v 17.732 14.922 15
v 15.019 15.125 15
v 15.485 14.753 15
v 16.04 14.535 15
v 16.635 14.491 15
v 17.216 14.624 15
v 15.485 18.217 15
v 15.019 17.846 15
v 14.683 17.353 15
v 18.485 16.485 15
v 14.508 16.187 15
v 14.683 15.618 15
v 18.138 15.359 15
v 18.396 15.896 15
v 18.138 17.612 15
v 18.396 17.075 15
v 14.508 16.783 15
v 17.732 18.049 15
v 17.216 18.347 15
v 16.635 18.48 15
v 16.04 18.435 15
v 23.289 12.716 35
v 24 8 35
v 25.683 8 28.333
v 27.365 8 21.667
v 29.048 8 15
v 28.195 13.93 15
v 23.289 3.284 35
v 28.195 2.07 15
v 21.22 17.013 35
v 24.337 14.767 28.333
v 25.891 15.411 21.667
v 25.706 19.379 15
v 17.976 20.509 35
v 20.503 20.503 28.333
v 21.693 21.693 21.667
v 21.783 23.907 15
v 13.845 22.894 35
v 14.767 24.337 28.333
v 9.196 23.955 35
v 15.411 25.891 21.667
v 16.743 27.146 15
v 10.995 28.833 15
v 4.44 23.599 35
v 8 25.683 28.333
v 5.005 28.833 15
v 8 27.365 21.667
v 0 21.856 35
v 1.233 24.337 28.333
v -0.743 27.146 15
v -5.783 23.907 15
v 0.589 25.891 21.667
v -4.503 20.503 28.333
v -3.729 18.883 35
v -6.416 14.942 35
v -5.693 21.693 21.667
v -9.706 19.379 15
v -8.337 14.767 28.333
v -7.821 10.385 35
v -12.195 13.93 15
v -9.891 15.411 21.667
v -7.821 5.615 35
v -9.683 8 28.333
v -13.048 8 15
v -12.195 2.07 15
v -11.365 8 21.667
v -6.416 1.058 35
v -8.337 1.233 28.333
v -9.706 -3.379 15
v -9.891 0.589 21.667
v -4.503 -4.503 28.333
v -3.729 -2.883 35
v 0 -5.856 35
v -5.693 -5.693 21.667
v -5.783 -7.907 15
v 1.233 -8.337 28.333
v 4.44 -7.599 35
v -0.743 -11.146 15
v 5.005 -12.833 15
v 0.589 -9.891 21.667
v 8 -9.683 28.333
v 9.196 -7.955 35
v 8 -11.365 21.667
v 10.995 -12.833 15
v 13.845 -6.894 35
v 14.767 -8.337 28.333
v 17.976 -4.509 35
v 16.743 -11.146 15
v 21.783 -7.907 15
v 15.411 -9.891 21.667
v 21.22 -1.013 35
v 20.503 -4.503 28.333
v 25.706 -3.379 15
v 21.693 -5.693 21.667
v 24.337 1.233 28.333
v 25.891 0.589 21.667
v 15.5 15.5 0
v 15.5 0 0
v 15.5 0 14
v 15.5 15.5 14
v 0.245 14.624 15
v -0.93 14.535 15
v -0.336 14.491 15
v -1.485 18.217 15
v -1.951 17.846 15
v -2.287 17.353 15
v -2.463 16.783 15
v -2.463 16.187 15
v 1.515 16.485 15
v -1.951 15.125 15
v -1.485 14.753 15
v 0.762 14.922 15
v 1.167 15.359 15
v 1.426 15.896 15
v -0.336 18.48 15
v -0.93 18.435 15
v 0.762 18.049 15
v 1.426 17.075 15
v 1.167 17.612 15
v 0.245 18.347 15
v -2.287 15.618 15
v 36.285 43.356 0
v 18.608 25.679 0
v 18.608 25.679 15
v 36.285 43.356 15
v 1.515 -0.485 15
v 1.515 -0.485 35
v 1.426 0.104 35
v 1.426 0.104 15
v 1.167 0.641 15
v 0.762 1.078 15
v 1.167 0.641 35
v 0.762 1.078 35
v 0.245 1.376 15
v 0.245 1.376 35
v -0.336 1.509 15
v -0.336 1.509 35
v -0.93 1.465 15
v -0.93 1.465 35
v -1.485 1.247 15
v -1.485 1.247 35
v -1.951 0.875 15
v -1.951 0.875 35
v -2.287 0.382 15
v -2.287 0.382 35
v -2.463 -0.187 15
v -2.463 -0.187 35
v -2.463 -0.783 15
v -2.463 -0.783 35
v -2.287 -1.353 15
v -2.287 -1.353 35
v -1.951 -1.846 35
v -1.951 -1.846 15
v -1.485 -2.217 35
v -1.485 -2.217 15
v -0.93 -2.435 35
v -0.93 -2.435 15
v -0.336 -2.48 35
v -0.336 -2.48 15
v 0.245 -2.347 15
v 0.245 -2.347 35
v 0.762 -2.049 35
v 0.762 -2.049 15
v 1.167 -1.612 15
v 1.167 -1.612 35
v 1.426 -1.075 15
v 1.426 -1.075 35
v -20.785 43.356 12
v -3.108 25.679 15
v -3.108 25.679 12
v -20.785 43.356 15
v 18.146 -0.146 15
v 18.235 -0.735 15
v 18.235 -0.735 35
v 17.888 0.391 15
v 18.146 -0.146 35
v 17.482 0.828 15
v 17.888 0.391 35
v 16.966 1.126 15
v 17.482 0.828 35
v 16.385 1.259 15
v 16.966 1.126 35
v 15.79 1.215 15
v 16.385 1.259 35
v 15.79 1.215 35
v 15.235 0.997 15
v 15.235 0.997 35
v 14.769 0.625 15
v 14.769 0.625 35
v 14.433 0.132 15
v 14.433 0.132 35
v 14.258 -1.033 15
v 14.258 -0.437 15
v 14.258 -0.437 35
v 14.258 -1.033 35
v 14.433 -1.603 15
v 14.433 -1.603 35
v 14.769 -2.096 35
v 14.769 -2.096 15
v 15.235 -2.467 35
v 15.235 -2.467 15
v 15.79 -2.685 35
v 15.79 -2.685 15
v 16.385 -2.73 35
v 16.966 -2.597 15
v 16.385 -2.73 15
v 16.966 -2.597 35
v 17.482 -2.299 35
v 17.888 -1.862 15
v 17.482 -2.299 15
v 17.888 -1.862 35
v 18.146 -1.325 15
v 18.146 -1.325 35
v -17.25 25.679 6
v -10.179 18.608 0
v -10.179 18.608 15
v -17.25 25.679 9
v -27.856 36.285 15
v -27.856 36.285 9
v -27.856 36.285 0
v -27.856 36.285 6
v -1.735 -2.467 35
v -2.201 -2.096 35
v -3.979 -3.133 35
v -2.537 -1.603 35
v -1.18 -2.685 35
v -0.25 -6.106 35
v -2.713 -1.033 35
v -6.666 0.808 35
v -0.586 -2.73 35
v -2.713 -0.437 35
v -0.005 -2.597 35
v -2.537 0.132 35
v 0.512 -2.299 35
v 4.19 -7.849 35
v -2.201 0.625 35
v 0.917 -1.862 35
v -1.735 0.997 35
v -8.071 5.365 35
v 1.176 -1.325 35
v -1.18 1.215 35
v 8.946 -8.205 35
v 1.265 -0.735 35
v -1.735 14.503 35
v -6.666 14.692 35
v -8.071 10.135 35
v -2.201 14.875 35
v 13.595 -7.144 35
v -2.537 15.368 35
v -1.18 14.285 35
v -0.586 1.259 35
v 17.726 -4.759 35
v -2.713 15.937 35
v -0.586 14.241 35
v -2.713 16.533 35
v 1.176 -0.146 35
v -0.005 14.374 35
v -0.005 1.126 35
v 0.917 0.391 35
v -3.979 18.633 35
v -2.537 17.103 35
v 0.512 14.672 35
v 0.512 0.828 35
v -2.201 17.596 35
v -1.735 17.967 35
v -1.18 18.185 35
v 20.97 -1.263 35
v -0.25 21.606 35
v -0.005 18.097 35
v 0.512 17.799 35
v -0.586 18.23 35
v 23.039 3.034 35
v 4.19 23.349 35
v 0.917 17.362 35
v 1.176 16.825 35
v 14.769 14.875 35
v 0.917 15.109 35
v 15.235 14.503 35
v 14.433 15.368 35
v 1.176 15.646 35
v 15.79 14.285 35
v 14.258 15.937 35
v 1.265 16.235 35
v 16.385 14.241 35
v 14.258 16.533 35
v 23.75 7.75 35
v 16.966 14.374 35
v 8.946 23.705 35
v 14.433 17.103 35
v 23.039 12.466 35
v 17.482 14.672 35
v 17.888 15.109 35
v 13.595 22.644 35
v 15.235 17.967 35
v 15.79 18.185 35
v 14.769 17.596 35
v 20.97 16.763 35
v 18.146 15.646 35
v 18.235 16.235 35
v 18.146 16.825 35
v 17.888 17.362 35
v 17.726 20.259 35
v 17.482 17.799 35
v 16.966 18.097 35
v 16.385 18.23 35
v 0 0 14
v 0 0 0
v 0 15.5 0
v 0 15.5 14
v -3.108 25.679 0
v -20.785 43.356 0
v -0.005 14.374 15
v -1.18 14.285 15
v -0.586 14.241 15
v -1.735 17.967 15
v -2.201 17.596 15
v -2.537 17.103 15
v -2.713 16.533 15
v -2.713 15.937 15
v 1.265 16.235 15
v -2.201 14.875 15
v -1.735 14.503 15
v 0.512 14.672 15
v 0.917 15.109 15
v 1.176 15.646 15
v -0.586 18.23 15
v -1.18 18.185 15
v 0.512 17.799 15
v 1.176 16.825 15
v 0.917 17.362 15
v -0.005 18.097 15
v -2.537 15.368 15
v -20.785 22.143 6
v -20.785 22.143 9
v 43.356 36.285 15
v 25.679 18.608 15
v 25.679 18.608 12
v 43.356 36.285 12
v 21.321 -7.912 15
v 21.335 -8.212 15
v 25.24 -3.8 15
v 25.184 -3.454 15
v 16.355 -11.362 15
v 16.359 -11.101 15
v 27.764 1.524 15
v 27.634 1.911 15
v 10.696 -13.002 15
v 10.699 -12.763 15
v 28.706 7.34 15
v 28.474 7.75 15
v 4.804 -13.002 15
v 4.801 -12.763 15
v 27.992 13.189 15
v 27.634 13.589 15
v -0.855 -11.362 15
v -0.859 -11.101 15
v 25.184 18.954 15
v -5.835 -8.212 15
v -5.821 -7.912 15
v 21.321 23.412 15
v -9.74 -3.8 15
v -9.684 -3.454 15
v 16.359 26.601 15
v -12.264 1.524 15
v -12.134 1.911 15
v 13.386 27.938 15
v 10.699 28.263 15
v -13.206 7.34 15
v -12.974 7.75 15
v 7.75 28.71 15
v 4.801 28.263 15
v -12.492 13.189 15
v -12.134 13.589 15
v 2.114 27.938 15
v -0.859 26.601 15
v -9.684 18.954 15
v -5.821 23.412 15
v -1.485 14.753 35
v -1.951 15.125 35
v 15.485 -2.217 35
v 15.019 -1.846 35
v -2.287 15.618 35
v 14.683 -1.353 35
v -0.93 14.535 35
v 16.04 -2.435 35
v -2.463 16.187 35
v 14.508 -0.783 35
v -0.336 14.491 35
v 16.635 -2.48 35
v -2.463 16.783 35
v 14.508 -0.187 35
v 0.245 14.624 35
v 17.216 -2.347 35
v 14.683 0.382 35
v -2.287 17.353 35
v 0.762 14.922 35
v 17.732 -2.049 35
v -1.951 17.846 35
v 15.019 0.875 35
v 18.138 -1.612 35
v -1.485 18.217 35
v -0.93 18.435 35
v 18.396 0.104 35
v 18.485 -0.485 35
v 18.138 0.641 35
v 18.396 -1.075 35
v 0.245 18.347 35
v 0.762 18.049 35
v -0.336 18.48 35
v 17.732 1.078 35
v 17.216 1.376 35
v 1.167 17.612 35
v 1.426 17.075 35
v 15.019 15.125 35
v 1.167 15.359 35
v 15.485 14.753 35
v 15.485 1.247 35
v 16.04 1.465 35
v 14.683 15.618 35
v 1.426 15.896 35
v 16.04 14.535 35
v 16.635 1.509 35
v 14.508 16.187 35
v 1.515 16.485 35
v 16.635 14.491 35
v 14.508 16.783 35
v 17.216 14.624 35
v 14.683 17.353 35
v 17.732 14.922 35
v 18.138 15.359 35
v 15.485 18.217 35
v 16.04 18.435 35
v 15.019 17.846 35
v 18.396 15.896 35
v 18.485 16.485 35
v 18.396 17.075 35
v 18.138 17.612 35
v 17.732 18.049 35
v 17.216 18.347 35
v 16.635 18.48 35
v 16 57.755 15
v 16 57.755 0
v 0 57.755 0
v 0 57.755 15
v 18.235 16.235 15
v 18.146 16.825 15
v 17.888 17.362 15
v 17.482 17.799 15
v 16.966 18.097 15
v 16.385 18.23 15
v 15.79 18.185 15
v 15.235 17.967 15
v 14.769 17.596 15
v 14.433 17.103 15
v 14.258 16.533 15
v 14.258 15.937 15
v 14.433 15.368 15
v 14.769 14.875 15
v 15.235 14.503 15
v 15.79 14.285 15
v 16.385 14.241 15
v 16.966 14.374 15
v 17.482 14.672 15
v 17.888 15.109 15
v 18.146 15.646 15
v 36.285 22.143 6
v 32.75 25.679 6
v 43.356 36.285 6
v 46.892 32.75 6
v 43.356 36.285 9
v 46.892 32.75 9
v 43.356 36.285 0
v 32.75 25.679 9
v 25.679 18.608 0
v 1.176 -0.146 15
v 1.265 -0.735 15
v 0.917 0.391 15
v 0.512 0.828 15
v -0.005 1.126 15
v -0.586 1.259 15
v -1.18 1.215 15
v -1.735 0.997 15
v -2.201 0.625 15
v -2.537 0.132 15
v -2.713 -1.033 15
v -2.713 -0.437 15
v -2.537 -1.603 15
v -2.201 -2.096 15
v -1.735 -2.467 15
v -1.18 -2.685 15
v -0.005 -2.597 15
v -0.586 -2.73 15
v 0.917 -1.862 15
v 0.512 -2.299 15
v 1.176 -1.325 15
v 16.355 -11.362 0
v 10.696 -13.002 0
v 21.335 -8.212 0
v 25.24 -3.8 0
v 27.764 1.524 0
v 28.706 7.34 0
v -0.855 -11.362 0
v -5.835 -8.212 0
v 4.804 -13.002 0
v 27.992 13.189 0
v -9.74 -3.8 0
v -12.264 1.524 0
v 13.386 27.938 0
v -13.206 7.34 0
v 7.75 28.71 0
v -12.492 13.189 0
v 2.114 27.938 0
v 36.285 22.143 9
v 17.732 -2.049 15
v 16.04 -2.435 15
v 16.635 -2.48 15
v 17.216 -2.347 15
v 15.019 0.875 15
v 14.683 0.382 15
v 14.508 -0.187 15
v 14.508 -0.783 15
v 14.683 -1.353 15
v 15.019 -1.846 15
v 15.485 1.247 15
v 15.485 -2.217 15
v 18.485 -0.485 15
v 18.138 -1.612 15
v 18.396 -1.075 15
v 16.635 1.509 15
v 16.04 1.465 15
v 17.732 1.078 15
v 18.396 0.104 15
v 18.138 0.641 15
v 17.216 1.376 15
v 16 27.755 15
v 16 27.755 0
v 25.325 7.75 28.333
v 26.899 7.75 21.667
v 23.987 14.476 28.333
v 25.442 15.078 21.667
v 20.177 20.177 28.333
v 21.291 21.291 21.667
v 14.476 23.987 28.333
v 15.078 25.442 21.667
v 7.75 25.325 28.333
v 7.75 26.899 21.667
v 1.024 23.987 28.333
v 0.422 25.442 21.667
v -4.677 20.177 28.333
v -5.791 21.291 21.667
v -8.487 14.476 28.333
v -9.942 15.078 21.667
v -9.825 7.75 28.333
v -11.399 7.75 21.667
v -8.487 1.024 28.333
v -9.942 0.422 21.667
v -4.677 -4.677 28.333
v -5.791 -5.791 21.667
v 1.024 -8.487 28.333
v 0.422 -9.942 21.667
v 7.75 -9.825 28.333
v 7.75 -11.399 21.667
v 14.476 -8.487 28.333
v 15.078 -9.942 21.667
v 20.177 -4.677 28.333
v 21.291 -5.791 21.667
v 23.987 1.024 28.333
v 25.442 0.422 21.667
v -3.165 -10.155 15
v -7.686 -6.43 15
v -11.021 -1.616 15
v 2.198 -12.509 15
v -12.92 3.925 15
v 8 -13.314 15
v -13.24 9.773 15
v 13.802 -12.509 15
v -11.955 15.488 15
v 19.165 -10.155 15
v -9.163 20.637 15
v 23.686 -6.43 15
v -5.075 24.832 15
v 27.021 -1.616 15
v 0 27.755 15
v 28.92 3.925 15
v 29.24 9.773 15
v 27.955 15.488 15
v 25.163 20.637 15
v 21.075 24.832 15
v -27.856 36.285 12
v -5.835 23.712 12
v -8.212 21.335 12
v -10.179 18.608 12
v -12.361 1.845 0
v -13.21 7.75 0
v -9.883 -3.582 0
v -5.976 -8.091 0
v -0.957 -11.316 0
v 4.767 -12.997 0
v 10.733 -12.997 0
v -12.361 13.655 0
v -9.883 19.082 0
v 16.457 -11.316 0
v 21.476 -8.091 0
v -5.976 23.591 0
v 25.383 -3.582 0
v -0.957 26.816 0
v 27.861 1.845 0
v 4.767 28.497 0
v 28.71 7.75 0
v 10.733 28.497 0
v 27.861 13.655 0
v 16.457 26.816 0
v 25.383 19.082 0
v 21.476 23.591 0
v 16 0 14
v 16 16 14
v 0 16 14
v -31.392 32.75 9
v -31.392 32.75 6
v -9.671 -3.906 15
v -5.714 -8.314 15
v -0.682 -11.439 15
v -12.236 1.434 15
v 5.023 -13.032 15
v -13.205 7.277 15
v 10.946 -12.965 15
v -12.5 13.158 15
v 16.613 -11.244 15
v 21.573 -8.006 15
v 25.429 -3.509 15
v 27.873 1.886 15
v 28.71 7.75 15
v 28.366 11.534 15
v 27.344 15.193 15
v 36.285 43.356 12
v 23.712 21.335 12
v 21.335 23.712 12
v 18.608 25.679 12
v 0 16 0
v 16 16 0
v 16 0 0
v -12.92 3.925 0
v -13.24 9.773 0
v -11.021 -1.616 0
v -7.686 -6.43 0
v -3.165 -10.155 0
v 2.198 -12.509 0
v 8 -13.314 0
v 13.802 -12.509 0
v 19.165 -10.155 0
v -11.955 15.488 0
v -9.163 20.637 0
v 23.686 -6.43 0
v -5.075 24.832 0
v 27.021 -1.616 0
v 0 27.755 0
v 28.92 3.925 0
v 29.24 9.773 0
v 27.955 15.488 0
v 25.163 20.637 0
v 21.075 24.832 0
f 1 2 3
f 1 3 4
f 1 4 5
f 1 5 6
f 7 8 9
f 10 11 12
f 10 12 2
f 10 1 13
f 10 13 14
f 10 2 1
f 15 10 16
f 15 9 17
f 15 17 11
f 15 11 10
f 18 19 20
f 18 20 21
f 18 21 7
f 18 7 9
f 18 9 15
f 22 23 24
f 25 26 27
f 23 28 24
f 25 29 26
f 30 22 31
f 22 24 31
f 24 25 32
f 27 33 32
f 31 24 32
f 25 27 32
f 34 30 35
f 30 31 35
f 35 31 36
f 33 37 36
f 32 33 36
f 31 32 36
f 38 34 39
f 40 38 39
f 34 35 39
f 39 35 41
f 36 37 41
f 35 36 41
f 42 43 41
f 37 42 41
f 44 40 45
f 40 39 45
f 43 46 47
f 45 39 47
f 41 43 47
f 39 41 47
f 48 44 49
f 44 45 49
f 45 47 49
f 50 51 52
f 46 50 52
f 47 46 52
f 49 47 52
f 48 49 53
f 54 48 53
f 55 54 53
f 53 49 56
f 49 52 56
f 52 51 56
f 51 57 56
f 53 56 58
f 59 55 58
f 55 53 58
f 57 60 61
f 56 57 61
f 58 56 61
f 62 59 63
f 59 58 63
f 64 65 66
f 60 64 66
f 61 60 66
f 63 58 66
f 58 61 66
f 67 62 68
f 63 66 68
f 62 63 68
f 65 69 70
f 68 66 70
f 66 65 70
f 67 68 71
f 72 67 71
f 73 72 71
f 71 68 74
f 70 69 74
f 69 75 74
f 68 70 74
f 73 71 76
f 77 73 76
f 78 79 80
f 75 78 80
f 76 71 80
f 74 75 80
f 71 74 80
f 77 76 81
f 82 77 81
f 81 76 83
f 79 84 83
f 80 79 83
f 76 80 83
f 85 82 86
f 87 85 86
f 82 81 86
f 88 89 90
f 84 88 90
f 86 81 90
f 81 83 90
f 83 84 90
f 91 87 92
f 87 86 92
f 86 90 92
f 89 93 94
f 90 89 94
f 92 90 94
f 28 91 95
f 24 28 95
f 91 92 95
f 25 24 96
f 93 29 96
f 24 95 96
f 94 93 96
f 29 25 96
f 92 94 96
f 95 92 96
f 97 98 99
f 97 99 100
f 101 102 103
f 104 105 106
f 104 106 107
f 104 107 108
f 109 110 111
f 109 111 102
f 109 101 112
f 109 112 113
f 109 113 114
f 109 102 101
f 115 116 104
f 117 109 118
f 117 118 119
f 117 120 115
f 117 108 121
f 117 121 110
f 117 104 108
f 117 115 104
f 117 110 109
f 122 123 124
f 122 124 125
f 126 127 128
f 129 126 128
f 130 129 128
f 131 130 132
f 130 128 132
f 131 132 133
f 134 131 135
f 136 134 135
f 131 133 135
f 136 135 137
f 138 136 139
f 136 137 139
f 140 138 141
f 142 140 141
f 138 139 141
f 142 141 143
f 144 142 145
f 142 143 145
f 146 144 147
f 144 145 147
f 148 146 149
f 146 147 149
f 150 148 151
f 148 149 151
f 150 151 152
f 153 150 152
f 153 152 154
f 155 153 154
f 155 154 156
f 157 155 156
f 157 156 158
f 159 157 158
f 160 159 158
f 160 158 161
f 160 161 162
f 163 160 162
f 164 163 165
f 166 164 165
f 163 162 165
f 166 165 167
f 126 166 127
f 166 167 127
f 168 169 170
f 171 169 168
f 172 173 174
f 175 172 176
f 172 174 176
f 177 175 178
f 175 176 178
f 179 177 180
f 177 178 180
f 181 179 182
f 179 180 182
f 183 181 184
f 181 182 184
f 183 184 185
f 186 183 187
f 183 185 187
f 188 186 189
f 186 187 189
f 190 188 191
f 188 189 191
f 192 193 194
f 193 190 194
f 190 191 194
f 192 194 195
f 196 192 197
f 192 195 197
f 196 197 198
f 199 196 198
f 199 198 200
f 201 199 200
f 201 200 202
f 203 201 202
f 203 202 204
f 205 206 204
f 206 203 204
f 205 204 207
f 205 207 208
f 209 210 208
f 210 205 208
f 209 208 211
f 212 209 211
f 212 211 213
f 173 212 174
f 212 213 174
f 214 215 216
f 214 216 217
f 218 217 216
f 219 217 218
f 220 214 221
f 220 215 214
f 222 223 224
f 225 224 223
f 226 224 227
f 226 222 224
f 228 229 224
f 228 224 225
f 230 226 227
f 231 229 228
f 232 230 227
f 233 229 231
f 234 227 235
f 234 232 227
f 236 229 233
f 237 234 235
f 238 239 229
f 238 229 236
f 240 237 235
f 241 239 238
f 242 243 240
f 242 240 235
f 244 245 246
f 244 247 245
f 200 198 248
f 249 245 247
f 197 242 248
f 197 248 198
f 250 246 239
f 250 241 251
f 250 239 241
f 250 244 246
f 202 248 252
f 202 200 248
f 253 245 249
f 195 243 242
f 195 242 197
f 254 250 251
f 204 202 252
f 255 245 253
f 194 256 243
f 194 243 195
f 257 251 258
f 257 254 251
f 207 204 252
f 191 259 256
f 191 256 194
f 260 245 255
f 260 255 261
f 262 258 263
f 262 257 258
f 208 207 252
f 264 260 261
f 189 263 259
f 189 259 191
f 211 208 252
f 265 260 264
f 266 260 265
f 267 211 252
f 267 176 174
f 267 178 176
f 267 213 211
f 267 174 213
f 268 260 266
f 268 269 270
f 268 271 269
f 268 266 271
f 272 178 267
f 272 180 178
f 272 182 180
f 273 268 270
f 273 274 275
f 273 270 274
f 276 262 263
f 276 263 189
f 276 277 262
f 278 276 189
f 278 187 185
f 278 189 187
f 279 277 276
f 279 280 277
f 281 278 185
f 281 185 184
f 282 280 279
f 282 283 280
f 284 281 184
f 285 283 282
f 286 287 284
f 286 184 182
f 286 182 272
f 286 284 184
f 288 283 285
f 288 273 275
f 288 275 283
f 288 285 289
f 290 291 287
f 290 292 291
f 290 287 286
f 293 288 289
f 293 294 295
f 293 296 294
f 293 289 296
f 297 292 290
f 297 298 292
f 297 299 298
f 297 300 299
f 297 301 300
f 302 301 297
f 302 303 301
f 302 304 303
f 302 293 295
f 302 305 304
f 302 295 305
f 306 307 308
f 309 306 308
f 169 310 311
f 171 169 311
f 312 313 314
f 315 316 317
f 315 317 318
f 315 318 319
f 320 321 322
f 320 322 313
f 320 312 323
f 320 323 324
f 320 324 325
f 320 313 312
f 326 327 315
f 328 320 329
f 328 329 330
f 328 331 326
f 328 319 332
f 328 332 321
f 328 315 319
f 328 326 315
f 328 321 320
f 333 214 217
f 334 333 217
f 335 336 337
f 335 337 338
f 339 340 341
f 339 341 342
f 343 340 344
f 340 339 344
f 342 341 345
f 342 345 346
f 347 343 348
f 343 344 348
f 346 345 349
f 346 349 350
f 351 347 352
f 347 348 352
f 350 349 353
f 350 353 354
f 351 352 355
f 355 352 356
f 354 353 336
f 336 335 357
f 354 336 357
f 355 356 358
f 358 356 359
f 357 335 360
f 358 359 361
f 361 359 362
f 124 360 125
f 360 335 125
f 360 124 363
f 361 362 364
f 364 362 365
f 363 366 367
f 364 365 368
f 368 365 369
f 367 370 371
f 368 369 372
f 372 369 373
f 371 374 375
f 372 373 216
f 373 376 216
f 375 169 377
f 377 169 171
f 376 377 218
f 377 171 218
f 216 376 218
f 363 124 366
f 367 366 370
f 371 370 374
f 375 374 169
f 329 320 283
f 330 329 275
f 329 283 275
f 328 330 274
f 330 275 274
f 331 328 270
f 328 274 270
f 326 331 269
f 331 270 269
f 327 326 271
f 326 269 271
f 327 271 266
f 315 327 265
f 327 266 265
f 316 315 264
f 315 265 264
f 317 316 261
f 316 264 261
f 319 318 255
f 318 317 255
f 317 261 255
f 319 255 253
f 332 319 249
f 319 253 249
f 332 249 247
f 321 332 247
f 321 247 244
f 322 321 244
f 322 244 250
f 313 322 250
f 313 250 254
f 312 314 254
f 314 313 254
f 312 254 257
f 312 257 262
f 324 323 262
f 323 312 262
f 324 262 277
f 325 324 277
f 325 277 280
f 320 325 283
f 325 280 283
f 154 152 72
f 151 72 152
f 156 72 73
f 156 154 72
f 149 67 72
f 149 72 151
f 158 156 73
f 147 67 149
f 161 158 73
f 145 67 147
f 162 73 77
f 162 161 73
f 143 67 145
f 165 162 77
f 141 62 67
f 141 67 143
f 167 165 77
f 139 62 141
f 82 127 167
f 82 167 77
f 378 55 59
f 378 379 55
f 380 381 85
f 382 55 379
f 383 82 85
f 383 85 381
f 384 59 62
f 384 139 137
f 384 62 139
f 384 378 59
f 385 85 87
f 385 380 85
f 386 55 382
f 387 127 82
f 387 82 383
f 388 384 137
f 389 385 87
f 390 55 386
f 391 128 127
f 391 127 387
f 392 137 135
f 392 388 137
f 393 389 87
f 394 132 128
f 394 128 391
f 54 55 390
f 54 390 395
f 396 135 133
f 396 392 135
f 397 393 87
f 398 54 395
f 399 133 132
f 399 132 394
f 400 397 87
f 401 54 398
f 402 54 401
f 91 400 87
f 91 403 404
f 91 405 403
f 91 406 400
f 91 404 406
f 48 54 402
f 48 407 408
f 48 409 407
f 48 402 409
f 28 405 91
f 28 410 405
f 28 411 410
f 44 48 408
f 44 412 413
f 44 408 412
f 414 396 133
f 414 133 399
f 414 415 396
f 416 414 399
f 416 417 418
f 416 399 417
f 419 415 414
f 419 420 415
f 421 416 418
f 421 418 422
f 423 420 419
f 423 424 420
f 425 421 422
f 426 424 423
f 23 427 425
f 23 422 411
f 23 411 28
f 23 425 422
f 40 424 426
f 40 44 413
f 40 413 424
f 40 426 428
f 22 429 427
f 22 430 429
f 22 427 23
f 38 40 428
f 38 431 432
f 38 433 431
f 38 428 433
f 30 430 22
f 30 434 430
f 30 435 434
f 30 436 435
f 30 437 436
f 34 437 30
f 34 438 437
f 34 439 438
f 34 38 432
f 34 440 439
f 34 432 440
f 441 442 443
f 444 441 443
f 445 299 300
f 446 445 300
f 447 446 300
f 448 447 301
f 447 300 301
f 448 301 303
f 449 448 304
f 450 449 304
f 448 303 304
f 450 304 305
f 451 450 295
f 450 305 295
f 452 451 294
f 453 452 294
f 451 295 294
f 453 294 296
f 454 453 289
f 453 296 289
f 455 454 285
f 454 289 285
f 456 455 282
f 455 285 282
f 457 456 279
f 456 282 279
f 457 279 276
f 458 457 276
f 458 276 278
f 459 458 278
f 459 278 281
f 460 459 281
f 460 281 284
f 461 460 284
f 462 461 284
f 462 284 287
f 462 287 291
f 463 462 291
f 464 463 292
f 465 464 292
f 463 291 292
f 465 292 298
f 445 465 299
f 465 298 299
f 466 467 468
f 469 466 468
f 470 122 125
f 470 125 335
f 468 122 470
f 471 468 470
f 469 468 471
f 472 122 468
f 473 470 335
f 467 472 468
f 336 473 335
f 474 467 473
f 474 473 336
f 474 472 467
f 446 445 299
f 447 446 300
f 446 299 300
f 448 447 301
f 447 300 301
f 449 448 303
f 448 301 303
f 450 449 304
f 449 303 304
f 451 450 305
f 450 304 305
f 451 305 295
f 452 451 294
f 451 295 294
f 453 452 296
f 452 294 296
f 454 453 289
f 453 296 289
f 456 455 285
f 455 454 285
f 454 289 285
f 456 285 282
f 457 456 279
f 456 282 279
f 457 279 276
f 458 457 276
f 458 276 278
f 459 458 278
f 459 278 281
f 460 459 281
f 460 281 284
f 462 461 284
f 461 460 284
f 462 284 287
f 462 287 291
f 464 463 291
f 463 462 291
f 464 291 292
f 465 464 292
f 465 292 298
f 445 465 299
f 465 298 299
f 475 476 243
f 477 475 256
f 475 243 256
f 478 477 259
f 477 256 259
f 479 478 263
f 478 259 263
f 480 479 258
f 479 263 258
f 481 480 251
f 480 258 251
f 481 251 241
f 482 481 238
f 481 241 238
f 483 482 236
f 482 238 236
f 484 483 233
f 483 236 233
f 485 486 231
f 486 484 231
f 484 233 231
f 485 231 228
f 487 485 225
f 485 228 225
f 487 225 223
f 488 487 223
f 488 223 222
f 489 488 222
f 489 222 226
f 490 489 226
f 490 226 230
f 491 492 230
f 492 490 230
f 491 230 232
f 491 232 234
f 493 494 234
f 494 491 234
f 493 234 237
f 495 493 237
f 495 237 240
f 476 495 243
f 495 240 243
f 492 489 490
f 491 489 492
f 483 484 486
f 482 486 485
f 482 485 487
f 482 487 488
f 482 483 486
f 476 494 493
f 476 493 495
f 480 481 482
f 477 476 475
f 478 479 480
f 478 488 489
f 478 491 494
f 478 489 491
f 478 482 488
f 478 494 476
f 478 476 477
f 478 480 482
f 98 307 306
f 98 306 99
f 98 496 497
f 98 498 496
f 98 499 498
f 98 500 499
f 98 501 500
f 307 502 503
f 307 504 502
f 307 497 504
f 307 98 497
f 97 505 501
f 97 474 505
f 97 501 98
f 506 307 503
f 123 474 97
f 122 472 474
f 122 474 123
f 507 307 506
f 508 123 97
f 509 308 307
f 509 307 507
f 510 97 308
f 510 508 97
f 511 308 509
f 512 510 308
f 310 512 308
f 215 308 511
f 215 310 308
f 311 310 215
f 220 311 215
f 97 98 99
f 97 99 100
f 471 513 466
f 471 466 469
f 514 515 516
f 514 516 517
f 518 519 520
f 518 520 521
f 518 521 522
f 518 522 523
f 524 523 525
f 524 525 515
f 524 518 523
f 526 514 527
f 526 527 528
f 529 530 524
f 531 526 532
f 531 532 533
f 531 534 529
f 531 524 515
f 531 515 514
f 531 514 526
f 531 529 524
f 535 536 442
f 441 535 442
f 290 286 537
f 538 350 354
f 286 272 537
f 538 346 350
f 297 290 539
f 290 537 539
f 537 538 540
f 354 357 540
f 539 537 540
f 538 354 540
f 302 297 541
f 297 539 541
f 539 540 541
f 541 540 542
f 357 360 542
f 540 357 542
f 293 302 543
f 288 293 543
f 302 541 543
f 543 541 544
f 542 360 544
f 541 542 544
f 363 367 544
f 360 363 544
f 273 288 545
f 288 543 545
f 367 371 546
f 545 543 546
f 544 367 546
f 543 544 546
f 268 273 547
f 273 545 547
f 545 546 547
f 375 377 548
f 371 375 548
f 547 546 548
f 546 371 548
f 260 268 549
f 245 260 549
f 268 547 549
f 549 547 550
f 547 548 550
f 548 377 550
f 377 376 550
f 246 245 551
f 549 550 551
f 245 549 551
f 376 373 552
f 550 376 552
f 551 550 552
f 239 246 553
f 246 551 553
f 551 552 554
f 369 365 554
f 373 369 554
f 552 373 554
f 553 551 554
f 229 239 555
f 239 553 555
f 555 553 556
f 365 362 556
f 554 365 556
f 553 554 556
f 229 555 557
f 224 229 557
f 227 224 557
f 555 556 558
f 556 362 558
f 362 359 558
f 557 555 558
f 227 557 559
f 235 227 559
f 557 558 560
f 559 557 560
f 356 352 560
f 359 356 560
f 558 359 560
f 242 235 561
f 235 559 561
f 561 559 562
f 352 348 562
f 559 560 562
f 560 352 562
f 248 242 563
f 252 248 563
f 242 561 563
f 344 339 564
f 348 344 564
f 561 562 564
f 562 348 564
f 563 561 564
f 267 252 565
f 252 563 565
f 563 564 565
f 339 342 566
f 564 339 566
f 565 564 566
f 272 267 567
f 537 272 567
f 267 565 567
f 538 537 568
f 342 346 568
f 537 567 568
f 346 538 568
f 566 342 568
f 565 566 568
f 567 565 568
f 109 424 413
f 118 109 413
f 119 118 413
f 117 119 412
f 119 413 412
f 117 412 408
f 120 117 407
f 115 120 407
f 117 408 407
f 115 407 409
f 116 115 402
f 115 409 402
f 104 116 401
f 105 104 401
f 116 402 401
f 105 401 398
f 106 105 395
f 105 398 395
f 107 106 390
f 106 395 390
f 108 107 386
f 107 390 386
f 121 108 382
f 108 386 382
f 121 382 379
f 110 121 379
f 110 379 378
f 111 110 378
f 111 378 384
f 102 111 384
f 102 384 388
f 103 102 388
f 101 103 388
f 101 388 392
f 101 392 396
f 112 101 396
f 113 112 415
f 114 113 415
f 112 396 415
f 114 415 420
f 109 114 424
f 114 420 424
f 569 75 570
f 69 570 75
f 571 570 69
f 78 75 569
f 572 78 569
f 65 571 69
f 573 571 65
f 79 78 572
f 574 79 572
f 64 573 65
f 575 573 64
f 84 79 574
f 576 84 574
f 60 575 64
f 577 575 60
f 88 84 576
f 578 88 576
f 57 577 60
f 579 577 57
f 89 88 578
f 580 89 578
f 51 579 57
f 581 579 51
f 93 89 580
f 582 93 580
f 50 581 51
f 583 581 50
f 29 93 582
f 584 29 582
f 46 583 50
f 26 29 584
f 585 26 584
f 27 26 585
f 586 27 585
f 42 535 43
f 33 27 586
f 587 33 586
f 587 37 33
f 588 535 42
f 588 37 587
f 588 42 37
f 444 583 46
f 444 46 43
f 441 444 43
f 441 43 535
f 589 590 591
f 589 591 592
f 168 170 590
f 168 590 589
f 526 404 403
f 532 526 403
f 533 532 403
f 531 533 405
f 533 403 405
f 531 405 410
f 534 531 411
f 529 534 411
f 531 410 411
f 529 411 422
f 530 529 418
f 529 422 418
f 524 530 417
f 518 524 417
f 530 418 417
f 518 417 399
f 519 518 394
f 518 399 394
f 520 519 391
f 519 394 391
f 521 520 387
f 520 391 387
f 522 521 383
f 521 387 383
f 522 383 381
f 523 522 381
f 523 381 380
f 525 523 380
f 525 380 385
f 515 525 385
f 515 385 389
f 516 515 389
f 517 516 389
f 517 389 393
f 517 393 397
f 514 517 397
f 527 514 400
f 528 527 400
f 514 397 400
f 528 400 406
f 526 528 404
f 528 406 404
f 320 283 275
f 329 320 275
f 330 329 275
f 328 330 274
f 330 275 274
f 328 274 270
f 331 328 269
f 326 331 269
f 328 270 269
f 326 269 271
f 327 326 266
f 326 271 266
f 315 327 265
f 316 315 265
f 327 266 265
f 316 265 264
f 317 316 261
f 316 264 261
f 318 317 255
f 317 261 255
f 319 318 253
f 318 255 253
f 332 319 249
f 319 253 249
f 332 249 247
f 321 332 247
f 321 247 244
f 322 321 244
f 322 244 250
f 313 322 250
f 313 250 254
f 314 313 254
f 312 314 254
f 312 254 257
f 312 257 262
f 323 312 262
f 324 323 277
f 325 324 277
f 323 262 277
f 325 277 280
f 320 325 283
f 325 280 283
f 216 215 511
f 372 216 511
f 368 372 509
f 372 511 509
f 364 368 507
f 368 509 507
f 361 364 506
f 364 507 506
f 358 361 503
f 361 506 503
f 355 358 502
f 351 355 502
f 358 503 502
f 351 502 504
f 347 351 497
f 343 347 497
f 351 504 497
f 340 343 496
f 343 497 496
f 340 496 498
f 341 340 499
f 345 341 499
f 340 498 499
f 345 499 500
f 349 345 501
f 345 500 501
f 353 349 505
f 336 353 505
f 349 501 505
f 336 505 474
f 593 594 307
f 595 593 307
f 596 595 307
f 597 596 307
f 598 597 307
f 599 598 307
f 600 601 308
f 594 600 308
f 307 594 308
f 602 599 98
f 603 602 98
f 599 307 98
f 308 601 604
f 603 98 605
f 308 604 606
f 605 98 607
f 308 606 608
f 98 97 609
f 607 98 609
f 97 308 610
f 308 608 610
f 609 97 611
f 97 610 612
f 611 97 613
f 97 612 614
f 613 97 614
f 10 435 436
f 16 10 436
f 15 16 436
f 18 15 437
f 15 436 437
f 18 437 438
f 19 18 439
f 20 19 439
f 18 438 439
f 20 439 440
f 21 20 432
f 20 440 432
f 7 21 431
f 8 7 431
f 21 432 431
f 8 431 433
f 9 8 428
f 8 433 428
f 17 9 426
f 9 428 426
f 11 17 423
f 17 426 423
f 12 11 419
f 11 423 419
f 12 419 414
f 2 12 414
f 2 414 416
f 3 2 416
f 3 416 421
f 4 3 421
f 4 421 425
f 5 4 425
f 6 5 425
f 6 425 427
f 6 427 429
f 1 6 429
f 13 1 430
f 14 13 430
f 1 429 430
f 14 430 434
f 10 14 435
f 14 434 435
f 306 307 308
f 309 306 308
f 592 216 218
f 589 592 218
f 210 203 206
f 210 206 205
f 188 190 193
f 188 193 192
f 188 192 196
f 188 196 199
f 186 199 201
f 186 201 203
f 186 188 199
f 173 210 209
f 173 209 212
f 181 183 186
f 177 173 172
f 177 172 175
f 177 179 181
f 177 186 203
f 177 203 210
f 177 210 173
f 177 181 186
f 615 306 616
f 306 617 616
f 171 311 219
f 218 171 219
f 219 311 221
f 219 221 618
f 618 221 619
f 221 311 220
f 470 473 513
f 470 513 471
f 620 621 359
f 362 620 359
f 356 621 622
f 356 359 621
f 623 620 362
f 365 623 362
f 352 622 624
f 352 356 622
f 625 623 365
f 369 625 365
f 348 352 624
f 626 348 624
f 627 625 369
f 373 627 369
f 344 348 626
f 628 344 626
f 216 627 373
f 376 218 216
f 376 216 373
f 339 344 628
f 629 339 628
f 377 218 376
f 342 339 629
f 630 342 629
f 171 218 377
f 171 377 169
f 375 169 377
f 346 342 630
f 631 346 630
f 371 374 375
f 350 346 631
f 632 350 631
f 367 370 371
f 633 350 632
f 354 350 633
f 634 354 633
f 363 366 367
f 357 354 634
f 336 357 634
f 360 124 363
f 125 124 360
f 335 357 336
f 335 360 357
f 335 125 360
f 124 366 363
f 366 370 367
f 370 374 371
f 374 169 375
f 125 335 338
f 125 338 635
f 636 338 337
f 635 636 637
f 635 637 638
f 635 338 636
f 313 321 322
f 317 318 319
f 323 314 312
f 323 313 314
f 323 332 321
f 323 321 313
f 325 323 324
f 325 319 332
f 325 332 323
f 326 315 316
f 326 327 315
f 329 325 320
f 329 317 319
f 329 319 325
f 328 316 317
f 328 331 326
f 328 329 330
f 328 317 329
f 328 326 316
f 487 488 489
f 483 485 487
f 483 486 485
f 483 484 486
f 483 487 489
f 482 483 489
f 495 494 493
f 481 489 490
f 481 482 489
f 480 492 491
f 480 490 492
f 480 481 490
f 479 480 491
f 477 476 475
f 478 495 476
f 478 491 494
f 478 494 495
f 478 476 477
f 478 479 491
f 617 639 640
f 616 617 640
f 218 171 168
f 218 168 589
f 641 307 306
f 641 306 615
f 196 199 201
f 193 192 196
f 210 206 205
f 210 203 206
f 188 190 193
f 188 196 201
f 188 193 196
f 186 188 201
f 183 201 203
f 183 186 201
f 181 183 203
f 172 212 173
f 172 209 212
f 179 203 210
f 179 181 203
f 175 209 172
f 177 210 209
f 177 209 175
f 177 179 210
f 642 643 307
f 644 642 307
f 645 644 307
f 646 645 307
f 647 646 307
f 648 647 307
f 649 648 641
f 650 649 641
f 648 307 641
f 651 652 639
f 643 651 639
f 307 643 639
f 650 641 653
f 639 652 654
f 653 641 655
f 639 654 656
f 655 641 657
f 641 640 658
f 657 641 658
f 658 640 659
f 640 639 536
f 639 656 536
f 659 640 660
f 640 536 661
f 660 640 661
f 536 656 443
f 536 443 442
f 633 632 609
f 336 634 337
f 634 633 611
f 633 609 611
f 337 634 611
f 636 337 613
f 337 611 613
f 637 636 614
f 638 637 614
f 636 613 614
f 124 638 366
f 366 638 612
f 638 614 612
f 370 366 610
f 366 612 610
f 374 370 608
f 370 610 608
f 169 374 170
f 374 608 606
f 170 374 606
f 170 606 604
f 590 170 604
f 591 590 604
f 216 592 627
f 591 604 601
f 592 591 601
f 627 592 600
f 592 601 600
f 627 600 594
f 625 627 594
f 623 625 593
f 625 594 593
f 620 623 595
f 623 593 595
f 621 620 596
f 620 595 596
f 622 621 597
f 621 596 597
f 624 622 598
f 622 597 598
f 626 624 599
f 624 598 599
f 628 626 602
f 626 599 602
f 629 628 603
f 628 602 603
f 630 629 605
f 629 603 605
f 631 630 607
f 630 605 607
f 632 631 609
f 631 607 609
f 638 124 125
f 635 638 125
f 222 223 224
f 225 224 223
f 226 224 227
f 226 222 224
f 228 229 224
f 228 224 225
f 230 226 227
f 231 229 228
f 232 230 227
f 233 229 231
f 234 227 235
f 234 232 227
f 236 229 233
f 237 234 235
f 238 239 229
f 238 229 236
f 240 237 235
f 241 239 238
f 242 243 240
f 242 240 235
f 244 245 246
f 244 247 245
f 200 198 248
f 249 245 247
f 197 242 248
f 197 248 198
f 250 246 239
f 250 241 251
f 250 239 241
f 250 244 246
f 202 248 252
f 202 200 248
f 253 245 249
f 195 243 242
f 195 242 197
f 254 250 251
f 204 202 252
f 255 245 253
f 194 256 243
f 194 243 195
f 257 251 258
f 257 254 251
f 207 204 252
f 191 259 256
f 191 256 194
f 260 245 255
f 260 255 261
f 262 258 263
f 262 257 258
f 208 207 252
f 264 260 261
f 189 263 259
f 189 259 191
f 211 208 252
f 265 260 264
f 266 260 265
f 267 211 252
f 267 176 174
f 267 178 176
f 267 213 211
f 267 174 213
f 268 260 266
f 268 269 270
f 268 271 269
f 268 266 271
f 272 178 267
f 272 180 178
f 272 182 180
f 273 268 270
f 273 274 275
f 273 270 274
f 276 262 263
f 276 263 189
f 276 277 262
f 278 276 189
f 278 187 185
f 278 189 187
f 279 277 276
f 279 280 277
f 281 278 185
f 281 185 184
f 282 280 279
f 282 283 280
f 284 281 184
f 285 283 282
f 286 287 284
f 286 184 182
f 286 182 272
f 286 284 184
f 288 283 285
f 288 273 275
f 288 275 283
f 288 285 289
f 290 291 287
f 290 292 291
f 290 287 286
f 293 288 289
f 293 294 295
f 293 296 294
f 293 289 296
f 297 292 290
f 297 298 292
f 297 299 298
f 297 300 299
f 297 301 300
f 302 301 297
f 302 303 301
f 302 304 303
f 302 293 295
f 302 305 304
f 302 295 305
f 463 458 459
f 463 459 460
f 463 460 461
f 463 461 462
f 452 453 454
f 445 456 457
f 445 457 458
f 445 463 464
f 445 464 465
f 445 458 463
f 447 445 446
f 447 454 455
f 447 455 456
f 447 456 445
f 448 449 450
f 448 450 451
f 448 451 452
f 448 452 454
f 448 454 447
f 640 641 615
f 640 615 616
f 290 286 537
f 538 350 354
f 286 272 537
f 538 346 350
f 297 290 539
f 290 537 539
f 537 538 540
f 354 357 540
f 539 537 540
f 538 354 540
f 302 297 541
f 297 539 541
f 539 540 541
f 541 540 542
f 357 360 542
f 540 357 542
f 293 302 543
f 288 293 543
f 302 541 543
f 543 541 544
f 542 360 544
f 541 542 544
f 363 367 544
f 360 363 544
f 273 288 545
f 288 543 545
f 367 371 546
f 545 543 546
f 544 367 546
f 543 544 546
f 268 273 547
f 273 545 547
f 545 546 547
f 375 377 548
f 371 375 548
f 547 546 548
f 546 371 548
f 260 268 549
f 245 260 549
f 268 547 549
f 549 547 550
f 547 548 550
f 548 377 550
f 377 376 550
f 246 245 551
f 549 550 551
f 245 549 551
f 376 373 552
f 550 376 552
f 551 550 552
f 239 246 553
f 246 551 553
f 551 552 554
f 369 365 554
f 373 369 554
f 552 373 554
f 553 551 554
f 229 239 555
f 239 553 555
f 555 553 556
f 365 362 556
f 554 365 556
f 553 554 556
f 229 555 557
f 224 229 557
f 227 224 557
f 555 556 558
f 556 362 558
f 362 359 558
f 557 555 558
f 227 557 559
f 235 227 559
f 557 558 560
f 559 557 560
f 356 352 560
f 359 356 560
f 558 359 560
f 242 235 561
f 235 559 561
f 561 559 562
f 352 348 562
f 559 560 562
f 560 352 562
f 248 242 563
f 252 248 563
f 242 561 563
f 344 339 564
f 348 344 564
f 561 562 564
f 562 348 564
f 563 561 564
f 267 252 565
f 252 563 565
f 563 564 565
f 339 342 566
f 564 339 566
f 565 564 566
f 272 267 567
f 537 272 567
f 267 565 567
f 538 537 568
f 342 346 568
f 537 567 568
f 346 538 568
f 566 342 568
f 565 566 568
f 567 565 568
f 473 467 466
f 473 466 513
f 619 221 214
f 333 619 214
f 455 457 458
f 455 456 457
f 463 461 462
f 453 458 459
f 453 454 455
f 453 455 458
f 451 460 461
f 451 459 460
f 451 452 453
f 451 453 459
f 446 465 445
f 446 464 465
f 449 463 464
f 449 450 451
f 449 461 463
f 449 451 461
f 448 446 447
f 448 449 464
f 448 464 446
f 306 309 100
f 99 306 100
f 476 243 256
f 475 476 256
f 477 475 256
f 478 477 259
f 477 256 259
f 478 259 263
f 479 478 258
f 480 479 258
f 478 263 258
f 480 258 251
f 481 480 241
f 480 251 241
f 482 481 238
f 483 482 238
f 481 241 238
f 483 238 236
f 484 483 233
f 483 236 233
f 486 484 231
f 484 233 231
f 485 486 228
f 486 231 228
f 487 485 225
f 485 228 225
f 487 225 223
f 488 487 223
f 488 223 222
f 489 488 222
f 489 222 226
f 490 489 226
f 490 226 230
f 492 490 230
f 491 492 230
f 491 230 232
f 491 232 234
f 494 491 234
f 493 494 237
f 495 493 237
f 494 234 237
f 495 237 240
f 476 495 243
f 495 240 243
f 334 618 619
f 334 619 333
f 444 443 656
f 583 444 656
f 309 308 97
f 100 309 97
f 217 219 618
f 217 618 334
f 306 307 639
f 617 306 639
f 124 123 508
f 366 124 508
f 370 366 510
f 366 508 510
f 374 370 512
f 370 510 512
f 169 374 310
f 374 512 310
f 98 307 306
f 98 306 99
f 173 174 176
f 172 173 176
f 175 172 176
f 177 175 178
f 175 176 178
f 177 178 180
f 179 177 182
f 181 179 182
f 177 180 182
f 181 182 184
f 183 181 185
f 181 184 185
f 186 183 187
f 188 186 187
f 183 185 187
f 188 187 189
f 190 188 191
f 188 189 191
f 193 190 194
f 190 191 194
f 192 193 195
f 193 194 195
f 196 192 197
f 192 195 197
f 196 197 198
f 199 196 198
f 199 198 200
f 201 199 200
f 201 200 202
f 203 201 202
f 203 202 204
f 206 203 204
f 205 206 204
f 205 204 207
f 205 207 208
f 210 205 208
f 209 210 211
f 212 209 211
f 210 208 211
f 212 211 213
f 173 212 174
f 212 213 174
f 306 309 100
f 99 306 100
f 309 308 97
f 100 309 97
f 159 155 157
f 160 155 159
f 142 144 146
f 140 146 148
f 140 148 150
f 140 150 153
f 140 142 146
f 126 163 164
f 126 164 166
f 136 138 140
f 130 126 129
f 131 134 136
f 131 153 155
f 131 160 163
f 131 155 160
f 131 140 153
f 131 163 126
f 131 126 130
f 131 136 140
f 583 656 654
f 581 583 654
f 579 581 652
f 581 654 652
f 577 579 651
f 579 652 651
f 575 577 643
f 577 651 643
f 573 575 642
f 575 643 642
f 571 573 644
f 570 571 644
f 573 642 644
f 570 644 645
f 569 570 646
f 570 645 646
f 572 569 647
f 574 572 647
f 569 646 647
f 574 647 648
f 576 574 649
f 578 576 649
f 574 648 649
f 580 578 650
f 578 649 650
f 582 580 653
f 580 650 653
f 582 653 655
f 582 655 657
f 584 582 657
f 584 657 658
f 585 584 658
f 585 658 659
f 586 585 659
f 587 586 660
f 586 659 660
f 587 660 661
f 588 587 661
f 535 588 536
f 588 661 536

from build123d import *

# Parameters (mm, degrees)
SKETCH005_R                               = 2
EXTRUDE001_DEPTH                          = 20
SKETCH_W                                  = 16
SKETCH_H                                  = 16
EXTRUDE_DEPTH                             = 15
SKETCH003_R                               = 16
SKETCH004_R                               = 21.3
SKETCH010_AS_DRAWN_W                      = 15
SKETCH010_AS_DRAWN_H                      = 3
EXTRUDE004_DEPTH                          = 5
EXTRUDE004_ONTO_SKETCH010_ROLL_ANGLE      = 90
EXTRUDE004_ONTO_SKETCH010_PLACEMENT_ANGLE = 45
SKETCH011_AS_DRAWN_W                      = 15
SKETCH011_AS_DRAWN_H                      = 3
EXTRUDE005_DEPTH                          = 5
EXTRUDE005_ONTO_SKETCH011_ROLL_ANGLE      = 90
EXTRUDE005_ONTO_SKETCH011_PLACEMENT_ANGLE = -45
SKETCH009_R                               = 2
EXTRUDE003_DEPTH                          = 20
SKETCH007_R                               = 16
SKETCH008_R                               = 20.9601551084
SKETCH006_W                               = 15.5
SKETCH006_H                               = 15.5
EXTRUDE002_DEPTH                          = 15
EXTRUDE008_DEPTH                          = 3
SKETCH015_R                               = 2
EXTRUDE007_DEPTH                          = 20
SKETCH013_R                               = 16
SKETCH014_R                               = 20.9601551084
SKETCH012_R                               = 20.9601551084
SKETCH012_W                               = 15.5
SKETCH012_H                               = 15.5
EXTRUDE006_DEPTH                          = 15


with BuildPart() as screwholes:
    # Sketch005 (on Face2 of Loft) → Extrude001 (new body)
    with BuildSketch(Plane.XY.offset(35)):
        with Locations((16.4852813742, 16.4852813742)):
            Circle(SKETCH005_R)
        with Locations((-0.4852813742, 16.4852813742)):
            Circle(SKETCH005_R)
        with Locations((-0.4852813742, -0.4852813742)):
            Circle(SKETCH005_R)
        with Locations((16.4852813742, -0.4852813742)):
            Circle(SKETCH005_R)
    extrude(amount=-EXTRUDE001_DEPTH)


with BuildPart() as socket:
    # Sketch → Extrude (new body)
    with BuildSketch(Plane.XY):
        with BuildLine():
            ThreePointArc((0, 27.7553580069), (8, -13.313708499), (16, 27.7553580069))
            Line((16, 27.7553580069), (16, 57.7553580069))
            Line((16, 57.7553580069), (0, 57.7553580069))
            Line((0, 57.7553580069), (0, 27.7553580069))
        make_face()
        with Locations((8, 8)):
            Rectangle(SKETCH_W, SKETCH_H, mode=Mode.SUBTRACT)
    extrude(amount=EXTRUDE_DEPTH)


with BuildPart() as adapter:
    # Sketch003 (on Face10 of Extrude) → Loft section 0
    with BuildSketch(Plane.XY.offset(35)):
        with Locations((8, 8)):
            Circle(SKETCH003_R)
    # Sketch004 (on Face10 of Extrude) → Loft section 1
    with BuildSketch(Plane.XY.offset(14)):
        with Locations((8, 8)):
            Circle(SKETCH004_R)
    loft()

    # Fusion: union Socket
    add(socket.part)

    # Cut: cut ScrewHoles
    add(screwholes.part, mode=Mode.SUBTRACT)


with BuildPart() as extrude004:
    # Sketch010 as drawn → Extrude004 (new)
    with BuildSketch(Plane.XY):
        with Locations((48.8152061319, 7.5)):
            Rectangle(SKETCH010_AS_DRAWN_W, SKETCH010_AS_DRAWN_H)
    extrude(amount=EXTRUDE004_DEPTH)


with BuildPart() as extrude004_1:
    # Extrude004 onto Sketch010 roll: moved
    add(extrude004.part.rotate(Axis((0, 0, 0), (1, 0, 0)), EXTRUDE004_ONTO_SKETCH010_ROLL_ANGLE))


with BuildPart() as extrude004_2:
    # Extrude004 onto Sketch010 placement: moved
    add(extrude004_1.part.moved(Location((3.5355339059, -3.5355339059, 0))).rotate(Axis((3.5355339059, -3.5355339059, 0), (0, 0, 1)), EXTRUDE004_ONTO_SKETCH010_PLACEMENT_ANGLE))


with BuildPart() as extrude005:
    # Sketch011 as drawn → Extrude005 (new)
    with BuildSketch(Plane.XY):
        with Locations((-37.8550510235, 7.5)):
            Rectangle(SKETCH011_AS_DRAWN_W, SKETCH011_AS_DRAWN_H)
    extrude(amount=EXTRUDE005_DEPTH)


with BuildPart() as extrude005_1:
    # Extrude005 onto Sketch011 roll: moved
    add(extrude005.part.rotate(Axis((0, 0, 0), (1, 0, 0)), EXTRUDE005_ONTO_SKETCH011_ROLL_ANGLE))


with BuildPart() as extrude005_2:
    # Extrude005 onto Sketch011 placement: moved
    add(extrude005_1.part.moved(Location((4.2144660941, 4.2144660941, 0))).rotate(Axis((4.2144660941, 4.2144660941, 0), (0, 0, 1)), EXTRUDE005_ONTO_SKETCH011_PLACEMENT_ANGLE))


with BuildPart() as screwholes001:
    # Sketch009 (on Face2 of Loft001) → Extrude003 (new body)
    with BuildSketch(Plane.XY.offset(35)):
        with Locations((16.2352813742, 16.2352813742)):
            Circle(SKETCH009_R)
        with Locations((-0.7352813742, 16.2352813742)):
            Circle(SKETCH009_R)
        with Locations((-0.7352813742, -0.7352813742)):
            Circle(SKETCH009_R)
        with Locations((16.2352813742, -0.7352813742)):
            Circle(SKETCH009_R)
    extrude(amount=-EXTRUDE003_DEPTH)


with BuildPart() as shaft001:
    # Sketch007 (on Face14 of Extrude002) → Loft001 section 0
    with BuildSketch(Plane.XY.offset(35)):
        with Locations((7.75, 7.75)):
            Circle(SKETCH007_R)
    # Sketch008 (on Face14 of Extrude002) → Loft001 section 1
    with BuildSketch(Plane.XY.offset(14)):
        with Locations((7.75, 7.75)):
            Circle(SKETCH008_R)
    loft()


with BuildPart() as adapterv2fins:
    # Sketch006 → Extrude002 (new body)
    with BuildSketch(Plane.XY):
        with BuildLine():
            Line((36.2853302338, 43.3563980457), (43.3563980457, 36.2853302338))
            Line((43.3563980457, 36.2853302338), (25.678728516, 18.6076607042))
            ThreePointArc((-10.178728516, 18.6076607042), (7.75, -13.2101551084), (25.678728516, 18.6076607042))
            Line((-10.178728516, 18.6076607042), (-27.8563980457, 36.2853302338))
            Line((-20.7853302338, 43.3563980457), (-27.8563980457, 36.2853302338))
            Line((-3.1076607041, 25.678728516), (-20.7853302338, 43.3563980457))
            ThreePointArc((18.6076607042, 25.678728516), (7.75, 28.7101551084), (-3.1076607041, 25.678728516))
            Line((18.6076607042, 25.678728516), (36.2853302338, 43.3563980457))
        make_face()
        with Locations((7.75, 7.75)):
            Rectangle(SKETCH006_W, SKETCH006_H, mode=Mode.SUBTRACT)
    extrude(amount=EXTRUDE002_DEPTH)

    # Fusion001: union Shaft001
    add(shaft001.part)

    # Cut001: cut ScrewHoles001
    add(screwholes001.part, mode=Mode.SUBTRACT)

    # Fusion002: union Extrude004, Extrude005
    add(extrude004_2.part)
    add(extrude005_2.part)


with BuildPart() as blades:
    # Sketch016 (on Face7 of Extrude006) → Extrude008 (new body)
    with BuildSketch(Plane.XY.offset(15)):
        with BuildLine():
            Line((18.6076607042, 25.678728516), (36.2853302338, 43.3563980457))
            Line((43.3563980457, 36.2853302338), (36.2853302338, 43.3563980457))
            Line((25.678728516, 18.6076607042), (43.3563980457, 36.2853302338))
            ThreePointArc((25.678728516, 18.6076607042), (22.5710678119, 22.5710678119), (18.6076607042, 25.678728516))
        make_face()
        with BuildLine():
            Line((-10.178728516, 18.6076607042), (-27.8563980457, 36.2853302338))
            Line((-20.7853302338, 43.3563980457), (-27.8563980457, 36.2853302338))
            Line((-3.1076607042, 25.678728516), (-20.7853302338, 43.3563980457))
            ThreePointArc((-3.1076607042, 25.678728516), (-7.0710678119, 22.5710678119), (-10.178728516, 18.6076607042))
        make_face()
    extrude(amount=-EXTRUDE008_DEPTH)


with BuildPart() as screwholes002:
    # Sketch015 (on Face2 of Loft002) → Extrude007 (new body)
    with BuildSketch(Plane.XY.offset(35)):
        with Locations((16.2352813742, 16.2352813742)):
            Circle(SKETCH015_R)
        with Locations((-0.7352813742, 16.2352813742)):
            Circle(SKETCH015_R)
        with Locations((-0.7352813742, -0.7352813742)):
            Circle(SKETCH015_R)
        with Locations((16.2352813742, -0.7352813742)):
            Circle(SKETCH015_R)
    extrude(amount=-EXTRUDE007_DEPTH)


with BuildPart() as shaftscrews:
    # Sketch013 (on Face7 of Extrude006) → Loft002 section 0
    with BuildSketch(Plane.XY.offset(35)):
        with Locations((7.75, 7.75)):
            Circle(SKETCH013_R)
    # Sketch014 (on Face7 of Extrude006) → Loft002 section 1
    with BuildSketch(Plane.XY.offset(14)):
        with Locations((7.75, 7.75)):
            Circle(SKETCH014_R)
    loft()

    # Cut002: cut ScrewHoles002
    add(screwholes002.part, mode=Mode.SUBTRACT)


with BuildPart() as adapterv3blades:
    # Sketch012 → Extrude006 (new body)
    with BuildSketch(Plane.XY):
        with Locations((7.75, 7.75)):
            Circle(SKETCH012_R)
        with Locations((7.75, 7.75)):
            Rectangle(SKETCH012_W, SKETCH012_H, mode=Mode.SUBTRACT)
    extrude(amount=EXTRUDE006_DEPTH)

    # Fusion003: union Blades, ShaftScrews
    add(blades.part)
    add(shaftscrews.part)


solid = Compound([adapter.part, adapterv2fins.part, adapterv3blades.part])
